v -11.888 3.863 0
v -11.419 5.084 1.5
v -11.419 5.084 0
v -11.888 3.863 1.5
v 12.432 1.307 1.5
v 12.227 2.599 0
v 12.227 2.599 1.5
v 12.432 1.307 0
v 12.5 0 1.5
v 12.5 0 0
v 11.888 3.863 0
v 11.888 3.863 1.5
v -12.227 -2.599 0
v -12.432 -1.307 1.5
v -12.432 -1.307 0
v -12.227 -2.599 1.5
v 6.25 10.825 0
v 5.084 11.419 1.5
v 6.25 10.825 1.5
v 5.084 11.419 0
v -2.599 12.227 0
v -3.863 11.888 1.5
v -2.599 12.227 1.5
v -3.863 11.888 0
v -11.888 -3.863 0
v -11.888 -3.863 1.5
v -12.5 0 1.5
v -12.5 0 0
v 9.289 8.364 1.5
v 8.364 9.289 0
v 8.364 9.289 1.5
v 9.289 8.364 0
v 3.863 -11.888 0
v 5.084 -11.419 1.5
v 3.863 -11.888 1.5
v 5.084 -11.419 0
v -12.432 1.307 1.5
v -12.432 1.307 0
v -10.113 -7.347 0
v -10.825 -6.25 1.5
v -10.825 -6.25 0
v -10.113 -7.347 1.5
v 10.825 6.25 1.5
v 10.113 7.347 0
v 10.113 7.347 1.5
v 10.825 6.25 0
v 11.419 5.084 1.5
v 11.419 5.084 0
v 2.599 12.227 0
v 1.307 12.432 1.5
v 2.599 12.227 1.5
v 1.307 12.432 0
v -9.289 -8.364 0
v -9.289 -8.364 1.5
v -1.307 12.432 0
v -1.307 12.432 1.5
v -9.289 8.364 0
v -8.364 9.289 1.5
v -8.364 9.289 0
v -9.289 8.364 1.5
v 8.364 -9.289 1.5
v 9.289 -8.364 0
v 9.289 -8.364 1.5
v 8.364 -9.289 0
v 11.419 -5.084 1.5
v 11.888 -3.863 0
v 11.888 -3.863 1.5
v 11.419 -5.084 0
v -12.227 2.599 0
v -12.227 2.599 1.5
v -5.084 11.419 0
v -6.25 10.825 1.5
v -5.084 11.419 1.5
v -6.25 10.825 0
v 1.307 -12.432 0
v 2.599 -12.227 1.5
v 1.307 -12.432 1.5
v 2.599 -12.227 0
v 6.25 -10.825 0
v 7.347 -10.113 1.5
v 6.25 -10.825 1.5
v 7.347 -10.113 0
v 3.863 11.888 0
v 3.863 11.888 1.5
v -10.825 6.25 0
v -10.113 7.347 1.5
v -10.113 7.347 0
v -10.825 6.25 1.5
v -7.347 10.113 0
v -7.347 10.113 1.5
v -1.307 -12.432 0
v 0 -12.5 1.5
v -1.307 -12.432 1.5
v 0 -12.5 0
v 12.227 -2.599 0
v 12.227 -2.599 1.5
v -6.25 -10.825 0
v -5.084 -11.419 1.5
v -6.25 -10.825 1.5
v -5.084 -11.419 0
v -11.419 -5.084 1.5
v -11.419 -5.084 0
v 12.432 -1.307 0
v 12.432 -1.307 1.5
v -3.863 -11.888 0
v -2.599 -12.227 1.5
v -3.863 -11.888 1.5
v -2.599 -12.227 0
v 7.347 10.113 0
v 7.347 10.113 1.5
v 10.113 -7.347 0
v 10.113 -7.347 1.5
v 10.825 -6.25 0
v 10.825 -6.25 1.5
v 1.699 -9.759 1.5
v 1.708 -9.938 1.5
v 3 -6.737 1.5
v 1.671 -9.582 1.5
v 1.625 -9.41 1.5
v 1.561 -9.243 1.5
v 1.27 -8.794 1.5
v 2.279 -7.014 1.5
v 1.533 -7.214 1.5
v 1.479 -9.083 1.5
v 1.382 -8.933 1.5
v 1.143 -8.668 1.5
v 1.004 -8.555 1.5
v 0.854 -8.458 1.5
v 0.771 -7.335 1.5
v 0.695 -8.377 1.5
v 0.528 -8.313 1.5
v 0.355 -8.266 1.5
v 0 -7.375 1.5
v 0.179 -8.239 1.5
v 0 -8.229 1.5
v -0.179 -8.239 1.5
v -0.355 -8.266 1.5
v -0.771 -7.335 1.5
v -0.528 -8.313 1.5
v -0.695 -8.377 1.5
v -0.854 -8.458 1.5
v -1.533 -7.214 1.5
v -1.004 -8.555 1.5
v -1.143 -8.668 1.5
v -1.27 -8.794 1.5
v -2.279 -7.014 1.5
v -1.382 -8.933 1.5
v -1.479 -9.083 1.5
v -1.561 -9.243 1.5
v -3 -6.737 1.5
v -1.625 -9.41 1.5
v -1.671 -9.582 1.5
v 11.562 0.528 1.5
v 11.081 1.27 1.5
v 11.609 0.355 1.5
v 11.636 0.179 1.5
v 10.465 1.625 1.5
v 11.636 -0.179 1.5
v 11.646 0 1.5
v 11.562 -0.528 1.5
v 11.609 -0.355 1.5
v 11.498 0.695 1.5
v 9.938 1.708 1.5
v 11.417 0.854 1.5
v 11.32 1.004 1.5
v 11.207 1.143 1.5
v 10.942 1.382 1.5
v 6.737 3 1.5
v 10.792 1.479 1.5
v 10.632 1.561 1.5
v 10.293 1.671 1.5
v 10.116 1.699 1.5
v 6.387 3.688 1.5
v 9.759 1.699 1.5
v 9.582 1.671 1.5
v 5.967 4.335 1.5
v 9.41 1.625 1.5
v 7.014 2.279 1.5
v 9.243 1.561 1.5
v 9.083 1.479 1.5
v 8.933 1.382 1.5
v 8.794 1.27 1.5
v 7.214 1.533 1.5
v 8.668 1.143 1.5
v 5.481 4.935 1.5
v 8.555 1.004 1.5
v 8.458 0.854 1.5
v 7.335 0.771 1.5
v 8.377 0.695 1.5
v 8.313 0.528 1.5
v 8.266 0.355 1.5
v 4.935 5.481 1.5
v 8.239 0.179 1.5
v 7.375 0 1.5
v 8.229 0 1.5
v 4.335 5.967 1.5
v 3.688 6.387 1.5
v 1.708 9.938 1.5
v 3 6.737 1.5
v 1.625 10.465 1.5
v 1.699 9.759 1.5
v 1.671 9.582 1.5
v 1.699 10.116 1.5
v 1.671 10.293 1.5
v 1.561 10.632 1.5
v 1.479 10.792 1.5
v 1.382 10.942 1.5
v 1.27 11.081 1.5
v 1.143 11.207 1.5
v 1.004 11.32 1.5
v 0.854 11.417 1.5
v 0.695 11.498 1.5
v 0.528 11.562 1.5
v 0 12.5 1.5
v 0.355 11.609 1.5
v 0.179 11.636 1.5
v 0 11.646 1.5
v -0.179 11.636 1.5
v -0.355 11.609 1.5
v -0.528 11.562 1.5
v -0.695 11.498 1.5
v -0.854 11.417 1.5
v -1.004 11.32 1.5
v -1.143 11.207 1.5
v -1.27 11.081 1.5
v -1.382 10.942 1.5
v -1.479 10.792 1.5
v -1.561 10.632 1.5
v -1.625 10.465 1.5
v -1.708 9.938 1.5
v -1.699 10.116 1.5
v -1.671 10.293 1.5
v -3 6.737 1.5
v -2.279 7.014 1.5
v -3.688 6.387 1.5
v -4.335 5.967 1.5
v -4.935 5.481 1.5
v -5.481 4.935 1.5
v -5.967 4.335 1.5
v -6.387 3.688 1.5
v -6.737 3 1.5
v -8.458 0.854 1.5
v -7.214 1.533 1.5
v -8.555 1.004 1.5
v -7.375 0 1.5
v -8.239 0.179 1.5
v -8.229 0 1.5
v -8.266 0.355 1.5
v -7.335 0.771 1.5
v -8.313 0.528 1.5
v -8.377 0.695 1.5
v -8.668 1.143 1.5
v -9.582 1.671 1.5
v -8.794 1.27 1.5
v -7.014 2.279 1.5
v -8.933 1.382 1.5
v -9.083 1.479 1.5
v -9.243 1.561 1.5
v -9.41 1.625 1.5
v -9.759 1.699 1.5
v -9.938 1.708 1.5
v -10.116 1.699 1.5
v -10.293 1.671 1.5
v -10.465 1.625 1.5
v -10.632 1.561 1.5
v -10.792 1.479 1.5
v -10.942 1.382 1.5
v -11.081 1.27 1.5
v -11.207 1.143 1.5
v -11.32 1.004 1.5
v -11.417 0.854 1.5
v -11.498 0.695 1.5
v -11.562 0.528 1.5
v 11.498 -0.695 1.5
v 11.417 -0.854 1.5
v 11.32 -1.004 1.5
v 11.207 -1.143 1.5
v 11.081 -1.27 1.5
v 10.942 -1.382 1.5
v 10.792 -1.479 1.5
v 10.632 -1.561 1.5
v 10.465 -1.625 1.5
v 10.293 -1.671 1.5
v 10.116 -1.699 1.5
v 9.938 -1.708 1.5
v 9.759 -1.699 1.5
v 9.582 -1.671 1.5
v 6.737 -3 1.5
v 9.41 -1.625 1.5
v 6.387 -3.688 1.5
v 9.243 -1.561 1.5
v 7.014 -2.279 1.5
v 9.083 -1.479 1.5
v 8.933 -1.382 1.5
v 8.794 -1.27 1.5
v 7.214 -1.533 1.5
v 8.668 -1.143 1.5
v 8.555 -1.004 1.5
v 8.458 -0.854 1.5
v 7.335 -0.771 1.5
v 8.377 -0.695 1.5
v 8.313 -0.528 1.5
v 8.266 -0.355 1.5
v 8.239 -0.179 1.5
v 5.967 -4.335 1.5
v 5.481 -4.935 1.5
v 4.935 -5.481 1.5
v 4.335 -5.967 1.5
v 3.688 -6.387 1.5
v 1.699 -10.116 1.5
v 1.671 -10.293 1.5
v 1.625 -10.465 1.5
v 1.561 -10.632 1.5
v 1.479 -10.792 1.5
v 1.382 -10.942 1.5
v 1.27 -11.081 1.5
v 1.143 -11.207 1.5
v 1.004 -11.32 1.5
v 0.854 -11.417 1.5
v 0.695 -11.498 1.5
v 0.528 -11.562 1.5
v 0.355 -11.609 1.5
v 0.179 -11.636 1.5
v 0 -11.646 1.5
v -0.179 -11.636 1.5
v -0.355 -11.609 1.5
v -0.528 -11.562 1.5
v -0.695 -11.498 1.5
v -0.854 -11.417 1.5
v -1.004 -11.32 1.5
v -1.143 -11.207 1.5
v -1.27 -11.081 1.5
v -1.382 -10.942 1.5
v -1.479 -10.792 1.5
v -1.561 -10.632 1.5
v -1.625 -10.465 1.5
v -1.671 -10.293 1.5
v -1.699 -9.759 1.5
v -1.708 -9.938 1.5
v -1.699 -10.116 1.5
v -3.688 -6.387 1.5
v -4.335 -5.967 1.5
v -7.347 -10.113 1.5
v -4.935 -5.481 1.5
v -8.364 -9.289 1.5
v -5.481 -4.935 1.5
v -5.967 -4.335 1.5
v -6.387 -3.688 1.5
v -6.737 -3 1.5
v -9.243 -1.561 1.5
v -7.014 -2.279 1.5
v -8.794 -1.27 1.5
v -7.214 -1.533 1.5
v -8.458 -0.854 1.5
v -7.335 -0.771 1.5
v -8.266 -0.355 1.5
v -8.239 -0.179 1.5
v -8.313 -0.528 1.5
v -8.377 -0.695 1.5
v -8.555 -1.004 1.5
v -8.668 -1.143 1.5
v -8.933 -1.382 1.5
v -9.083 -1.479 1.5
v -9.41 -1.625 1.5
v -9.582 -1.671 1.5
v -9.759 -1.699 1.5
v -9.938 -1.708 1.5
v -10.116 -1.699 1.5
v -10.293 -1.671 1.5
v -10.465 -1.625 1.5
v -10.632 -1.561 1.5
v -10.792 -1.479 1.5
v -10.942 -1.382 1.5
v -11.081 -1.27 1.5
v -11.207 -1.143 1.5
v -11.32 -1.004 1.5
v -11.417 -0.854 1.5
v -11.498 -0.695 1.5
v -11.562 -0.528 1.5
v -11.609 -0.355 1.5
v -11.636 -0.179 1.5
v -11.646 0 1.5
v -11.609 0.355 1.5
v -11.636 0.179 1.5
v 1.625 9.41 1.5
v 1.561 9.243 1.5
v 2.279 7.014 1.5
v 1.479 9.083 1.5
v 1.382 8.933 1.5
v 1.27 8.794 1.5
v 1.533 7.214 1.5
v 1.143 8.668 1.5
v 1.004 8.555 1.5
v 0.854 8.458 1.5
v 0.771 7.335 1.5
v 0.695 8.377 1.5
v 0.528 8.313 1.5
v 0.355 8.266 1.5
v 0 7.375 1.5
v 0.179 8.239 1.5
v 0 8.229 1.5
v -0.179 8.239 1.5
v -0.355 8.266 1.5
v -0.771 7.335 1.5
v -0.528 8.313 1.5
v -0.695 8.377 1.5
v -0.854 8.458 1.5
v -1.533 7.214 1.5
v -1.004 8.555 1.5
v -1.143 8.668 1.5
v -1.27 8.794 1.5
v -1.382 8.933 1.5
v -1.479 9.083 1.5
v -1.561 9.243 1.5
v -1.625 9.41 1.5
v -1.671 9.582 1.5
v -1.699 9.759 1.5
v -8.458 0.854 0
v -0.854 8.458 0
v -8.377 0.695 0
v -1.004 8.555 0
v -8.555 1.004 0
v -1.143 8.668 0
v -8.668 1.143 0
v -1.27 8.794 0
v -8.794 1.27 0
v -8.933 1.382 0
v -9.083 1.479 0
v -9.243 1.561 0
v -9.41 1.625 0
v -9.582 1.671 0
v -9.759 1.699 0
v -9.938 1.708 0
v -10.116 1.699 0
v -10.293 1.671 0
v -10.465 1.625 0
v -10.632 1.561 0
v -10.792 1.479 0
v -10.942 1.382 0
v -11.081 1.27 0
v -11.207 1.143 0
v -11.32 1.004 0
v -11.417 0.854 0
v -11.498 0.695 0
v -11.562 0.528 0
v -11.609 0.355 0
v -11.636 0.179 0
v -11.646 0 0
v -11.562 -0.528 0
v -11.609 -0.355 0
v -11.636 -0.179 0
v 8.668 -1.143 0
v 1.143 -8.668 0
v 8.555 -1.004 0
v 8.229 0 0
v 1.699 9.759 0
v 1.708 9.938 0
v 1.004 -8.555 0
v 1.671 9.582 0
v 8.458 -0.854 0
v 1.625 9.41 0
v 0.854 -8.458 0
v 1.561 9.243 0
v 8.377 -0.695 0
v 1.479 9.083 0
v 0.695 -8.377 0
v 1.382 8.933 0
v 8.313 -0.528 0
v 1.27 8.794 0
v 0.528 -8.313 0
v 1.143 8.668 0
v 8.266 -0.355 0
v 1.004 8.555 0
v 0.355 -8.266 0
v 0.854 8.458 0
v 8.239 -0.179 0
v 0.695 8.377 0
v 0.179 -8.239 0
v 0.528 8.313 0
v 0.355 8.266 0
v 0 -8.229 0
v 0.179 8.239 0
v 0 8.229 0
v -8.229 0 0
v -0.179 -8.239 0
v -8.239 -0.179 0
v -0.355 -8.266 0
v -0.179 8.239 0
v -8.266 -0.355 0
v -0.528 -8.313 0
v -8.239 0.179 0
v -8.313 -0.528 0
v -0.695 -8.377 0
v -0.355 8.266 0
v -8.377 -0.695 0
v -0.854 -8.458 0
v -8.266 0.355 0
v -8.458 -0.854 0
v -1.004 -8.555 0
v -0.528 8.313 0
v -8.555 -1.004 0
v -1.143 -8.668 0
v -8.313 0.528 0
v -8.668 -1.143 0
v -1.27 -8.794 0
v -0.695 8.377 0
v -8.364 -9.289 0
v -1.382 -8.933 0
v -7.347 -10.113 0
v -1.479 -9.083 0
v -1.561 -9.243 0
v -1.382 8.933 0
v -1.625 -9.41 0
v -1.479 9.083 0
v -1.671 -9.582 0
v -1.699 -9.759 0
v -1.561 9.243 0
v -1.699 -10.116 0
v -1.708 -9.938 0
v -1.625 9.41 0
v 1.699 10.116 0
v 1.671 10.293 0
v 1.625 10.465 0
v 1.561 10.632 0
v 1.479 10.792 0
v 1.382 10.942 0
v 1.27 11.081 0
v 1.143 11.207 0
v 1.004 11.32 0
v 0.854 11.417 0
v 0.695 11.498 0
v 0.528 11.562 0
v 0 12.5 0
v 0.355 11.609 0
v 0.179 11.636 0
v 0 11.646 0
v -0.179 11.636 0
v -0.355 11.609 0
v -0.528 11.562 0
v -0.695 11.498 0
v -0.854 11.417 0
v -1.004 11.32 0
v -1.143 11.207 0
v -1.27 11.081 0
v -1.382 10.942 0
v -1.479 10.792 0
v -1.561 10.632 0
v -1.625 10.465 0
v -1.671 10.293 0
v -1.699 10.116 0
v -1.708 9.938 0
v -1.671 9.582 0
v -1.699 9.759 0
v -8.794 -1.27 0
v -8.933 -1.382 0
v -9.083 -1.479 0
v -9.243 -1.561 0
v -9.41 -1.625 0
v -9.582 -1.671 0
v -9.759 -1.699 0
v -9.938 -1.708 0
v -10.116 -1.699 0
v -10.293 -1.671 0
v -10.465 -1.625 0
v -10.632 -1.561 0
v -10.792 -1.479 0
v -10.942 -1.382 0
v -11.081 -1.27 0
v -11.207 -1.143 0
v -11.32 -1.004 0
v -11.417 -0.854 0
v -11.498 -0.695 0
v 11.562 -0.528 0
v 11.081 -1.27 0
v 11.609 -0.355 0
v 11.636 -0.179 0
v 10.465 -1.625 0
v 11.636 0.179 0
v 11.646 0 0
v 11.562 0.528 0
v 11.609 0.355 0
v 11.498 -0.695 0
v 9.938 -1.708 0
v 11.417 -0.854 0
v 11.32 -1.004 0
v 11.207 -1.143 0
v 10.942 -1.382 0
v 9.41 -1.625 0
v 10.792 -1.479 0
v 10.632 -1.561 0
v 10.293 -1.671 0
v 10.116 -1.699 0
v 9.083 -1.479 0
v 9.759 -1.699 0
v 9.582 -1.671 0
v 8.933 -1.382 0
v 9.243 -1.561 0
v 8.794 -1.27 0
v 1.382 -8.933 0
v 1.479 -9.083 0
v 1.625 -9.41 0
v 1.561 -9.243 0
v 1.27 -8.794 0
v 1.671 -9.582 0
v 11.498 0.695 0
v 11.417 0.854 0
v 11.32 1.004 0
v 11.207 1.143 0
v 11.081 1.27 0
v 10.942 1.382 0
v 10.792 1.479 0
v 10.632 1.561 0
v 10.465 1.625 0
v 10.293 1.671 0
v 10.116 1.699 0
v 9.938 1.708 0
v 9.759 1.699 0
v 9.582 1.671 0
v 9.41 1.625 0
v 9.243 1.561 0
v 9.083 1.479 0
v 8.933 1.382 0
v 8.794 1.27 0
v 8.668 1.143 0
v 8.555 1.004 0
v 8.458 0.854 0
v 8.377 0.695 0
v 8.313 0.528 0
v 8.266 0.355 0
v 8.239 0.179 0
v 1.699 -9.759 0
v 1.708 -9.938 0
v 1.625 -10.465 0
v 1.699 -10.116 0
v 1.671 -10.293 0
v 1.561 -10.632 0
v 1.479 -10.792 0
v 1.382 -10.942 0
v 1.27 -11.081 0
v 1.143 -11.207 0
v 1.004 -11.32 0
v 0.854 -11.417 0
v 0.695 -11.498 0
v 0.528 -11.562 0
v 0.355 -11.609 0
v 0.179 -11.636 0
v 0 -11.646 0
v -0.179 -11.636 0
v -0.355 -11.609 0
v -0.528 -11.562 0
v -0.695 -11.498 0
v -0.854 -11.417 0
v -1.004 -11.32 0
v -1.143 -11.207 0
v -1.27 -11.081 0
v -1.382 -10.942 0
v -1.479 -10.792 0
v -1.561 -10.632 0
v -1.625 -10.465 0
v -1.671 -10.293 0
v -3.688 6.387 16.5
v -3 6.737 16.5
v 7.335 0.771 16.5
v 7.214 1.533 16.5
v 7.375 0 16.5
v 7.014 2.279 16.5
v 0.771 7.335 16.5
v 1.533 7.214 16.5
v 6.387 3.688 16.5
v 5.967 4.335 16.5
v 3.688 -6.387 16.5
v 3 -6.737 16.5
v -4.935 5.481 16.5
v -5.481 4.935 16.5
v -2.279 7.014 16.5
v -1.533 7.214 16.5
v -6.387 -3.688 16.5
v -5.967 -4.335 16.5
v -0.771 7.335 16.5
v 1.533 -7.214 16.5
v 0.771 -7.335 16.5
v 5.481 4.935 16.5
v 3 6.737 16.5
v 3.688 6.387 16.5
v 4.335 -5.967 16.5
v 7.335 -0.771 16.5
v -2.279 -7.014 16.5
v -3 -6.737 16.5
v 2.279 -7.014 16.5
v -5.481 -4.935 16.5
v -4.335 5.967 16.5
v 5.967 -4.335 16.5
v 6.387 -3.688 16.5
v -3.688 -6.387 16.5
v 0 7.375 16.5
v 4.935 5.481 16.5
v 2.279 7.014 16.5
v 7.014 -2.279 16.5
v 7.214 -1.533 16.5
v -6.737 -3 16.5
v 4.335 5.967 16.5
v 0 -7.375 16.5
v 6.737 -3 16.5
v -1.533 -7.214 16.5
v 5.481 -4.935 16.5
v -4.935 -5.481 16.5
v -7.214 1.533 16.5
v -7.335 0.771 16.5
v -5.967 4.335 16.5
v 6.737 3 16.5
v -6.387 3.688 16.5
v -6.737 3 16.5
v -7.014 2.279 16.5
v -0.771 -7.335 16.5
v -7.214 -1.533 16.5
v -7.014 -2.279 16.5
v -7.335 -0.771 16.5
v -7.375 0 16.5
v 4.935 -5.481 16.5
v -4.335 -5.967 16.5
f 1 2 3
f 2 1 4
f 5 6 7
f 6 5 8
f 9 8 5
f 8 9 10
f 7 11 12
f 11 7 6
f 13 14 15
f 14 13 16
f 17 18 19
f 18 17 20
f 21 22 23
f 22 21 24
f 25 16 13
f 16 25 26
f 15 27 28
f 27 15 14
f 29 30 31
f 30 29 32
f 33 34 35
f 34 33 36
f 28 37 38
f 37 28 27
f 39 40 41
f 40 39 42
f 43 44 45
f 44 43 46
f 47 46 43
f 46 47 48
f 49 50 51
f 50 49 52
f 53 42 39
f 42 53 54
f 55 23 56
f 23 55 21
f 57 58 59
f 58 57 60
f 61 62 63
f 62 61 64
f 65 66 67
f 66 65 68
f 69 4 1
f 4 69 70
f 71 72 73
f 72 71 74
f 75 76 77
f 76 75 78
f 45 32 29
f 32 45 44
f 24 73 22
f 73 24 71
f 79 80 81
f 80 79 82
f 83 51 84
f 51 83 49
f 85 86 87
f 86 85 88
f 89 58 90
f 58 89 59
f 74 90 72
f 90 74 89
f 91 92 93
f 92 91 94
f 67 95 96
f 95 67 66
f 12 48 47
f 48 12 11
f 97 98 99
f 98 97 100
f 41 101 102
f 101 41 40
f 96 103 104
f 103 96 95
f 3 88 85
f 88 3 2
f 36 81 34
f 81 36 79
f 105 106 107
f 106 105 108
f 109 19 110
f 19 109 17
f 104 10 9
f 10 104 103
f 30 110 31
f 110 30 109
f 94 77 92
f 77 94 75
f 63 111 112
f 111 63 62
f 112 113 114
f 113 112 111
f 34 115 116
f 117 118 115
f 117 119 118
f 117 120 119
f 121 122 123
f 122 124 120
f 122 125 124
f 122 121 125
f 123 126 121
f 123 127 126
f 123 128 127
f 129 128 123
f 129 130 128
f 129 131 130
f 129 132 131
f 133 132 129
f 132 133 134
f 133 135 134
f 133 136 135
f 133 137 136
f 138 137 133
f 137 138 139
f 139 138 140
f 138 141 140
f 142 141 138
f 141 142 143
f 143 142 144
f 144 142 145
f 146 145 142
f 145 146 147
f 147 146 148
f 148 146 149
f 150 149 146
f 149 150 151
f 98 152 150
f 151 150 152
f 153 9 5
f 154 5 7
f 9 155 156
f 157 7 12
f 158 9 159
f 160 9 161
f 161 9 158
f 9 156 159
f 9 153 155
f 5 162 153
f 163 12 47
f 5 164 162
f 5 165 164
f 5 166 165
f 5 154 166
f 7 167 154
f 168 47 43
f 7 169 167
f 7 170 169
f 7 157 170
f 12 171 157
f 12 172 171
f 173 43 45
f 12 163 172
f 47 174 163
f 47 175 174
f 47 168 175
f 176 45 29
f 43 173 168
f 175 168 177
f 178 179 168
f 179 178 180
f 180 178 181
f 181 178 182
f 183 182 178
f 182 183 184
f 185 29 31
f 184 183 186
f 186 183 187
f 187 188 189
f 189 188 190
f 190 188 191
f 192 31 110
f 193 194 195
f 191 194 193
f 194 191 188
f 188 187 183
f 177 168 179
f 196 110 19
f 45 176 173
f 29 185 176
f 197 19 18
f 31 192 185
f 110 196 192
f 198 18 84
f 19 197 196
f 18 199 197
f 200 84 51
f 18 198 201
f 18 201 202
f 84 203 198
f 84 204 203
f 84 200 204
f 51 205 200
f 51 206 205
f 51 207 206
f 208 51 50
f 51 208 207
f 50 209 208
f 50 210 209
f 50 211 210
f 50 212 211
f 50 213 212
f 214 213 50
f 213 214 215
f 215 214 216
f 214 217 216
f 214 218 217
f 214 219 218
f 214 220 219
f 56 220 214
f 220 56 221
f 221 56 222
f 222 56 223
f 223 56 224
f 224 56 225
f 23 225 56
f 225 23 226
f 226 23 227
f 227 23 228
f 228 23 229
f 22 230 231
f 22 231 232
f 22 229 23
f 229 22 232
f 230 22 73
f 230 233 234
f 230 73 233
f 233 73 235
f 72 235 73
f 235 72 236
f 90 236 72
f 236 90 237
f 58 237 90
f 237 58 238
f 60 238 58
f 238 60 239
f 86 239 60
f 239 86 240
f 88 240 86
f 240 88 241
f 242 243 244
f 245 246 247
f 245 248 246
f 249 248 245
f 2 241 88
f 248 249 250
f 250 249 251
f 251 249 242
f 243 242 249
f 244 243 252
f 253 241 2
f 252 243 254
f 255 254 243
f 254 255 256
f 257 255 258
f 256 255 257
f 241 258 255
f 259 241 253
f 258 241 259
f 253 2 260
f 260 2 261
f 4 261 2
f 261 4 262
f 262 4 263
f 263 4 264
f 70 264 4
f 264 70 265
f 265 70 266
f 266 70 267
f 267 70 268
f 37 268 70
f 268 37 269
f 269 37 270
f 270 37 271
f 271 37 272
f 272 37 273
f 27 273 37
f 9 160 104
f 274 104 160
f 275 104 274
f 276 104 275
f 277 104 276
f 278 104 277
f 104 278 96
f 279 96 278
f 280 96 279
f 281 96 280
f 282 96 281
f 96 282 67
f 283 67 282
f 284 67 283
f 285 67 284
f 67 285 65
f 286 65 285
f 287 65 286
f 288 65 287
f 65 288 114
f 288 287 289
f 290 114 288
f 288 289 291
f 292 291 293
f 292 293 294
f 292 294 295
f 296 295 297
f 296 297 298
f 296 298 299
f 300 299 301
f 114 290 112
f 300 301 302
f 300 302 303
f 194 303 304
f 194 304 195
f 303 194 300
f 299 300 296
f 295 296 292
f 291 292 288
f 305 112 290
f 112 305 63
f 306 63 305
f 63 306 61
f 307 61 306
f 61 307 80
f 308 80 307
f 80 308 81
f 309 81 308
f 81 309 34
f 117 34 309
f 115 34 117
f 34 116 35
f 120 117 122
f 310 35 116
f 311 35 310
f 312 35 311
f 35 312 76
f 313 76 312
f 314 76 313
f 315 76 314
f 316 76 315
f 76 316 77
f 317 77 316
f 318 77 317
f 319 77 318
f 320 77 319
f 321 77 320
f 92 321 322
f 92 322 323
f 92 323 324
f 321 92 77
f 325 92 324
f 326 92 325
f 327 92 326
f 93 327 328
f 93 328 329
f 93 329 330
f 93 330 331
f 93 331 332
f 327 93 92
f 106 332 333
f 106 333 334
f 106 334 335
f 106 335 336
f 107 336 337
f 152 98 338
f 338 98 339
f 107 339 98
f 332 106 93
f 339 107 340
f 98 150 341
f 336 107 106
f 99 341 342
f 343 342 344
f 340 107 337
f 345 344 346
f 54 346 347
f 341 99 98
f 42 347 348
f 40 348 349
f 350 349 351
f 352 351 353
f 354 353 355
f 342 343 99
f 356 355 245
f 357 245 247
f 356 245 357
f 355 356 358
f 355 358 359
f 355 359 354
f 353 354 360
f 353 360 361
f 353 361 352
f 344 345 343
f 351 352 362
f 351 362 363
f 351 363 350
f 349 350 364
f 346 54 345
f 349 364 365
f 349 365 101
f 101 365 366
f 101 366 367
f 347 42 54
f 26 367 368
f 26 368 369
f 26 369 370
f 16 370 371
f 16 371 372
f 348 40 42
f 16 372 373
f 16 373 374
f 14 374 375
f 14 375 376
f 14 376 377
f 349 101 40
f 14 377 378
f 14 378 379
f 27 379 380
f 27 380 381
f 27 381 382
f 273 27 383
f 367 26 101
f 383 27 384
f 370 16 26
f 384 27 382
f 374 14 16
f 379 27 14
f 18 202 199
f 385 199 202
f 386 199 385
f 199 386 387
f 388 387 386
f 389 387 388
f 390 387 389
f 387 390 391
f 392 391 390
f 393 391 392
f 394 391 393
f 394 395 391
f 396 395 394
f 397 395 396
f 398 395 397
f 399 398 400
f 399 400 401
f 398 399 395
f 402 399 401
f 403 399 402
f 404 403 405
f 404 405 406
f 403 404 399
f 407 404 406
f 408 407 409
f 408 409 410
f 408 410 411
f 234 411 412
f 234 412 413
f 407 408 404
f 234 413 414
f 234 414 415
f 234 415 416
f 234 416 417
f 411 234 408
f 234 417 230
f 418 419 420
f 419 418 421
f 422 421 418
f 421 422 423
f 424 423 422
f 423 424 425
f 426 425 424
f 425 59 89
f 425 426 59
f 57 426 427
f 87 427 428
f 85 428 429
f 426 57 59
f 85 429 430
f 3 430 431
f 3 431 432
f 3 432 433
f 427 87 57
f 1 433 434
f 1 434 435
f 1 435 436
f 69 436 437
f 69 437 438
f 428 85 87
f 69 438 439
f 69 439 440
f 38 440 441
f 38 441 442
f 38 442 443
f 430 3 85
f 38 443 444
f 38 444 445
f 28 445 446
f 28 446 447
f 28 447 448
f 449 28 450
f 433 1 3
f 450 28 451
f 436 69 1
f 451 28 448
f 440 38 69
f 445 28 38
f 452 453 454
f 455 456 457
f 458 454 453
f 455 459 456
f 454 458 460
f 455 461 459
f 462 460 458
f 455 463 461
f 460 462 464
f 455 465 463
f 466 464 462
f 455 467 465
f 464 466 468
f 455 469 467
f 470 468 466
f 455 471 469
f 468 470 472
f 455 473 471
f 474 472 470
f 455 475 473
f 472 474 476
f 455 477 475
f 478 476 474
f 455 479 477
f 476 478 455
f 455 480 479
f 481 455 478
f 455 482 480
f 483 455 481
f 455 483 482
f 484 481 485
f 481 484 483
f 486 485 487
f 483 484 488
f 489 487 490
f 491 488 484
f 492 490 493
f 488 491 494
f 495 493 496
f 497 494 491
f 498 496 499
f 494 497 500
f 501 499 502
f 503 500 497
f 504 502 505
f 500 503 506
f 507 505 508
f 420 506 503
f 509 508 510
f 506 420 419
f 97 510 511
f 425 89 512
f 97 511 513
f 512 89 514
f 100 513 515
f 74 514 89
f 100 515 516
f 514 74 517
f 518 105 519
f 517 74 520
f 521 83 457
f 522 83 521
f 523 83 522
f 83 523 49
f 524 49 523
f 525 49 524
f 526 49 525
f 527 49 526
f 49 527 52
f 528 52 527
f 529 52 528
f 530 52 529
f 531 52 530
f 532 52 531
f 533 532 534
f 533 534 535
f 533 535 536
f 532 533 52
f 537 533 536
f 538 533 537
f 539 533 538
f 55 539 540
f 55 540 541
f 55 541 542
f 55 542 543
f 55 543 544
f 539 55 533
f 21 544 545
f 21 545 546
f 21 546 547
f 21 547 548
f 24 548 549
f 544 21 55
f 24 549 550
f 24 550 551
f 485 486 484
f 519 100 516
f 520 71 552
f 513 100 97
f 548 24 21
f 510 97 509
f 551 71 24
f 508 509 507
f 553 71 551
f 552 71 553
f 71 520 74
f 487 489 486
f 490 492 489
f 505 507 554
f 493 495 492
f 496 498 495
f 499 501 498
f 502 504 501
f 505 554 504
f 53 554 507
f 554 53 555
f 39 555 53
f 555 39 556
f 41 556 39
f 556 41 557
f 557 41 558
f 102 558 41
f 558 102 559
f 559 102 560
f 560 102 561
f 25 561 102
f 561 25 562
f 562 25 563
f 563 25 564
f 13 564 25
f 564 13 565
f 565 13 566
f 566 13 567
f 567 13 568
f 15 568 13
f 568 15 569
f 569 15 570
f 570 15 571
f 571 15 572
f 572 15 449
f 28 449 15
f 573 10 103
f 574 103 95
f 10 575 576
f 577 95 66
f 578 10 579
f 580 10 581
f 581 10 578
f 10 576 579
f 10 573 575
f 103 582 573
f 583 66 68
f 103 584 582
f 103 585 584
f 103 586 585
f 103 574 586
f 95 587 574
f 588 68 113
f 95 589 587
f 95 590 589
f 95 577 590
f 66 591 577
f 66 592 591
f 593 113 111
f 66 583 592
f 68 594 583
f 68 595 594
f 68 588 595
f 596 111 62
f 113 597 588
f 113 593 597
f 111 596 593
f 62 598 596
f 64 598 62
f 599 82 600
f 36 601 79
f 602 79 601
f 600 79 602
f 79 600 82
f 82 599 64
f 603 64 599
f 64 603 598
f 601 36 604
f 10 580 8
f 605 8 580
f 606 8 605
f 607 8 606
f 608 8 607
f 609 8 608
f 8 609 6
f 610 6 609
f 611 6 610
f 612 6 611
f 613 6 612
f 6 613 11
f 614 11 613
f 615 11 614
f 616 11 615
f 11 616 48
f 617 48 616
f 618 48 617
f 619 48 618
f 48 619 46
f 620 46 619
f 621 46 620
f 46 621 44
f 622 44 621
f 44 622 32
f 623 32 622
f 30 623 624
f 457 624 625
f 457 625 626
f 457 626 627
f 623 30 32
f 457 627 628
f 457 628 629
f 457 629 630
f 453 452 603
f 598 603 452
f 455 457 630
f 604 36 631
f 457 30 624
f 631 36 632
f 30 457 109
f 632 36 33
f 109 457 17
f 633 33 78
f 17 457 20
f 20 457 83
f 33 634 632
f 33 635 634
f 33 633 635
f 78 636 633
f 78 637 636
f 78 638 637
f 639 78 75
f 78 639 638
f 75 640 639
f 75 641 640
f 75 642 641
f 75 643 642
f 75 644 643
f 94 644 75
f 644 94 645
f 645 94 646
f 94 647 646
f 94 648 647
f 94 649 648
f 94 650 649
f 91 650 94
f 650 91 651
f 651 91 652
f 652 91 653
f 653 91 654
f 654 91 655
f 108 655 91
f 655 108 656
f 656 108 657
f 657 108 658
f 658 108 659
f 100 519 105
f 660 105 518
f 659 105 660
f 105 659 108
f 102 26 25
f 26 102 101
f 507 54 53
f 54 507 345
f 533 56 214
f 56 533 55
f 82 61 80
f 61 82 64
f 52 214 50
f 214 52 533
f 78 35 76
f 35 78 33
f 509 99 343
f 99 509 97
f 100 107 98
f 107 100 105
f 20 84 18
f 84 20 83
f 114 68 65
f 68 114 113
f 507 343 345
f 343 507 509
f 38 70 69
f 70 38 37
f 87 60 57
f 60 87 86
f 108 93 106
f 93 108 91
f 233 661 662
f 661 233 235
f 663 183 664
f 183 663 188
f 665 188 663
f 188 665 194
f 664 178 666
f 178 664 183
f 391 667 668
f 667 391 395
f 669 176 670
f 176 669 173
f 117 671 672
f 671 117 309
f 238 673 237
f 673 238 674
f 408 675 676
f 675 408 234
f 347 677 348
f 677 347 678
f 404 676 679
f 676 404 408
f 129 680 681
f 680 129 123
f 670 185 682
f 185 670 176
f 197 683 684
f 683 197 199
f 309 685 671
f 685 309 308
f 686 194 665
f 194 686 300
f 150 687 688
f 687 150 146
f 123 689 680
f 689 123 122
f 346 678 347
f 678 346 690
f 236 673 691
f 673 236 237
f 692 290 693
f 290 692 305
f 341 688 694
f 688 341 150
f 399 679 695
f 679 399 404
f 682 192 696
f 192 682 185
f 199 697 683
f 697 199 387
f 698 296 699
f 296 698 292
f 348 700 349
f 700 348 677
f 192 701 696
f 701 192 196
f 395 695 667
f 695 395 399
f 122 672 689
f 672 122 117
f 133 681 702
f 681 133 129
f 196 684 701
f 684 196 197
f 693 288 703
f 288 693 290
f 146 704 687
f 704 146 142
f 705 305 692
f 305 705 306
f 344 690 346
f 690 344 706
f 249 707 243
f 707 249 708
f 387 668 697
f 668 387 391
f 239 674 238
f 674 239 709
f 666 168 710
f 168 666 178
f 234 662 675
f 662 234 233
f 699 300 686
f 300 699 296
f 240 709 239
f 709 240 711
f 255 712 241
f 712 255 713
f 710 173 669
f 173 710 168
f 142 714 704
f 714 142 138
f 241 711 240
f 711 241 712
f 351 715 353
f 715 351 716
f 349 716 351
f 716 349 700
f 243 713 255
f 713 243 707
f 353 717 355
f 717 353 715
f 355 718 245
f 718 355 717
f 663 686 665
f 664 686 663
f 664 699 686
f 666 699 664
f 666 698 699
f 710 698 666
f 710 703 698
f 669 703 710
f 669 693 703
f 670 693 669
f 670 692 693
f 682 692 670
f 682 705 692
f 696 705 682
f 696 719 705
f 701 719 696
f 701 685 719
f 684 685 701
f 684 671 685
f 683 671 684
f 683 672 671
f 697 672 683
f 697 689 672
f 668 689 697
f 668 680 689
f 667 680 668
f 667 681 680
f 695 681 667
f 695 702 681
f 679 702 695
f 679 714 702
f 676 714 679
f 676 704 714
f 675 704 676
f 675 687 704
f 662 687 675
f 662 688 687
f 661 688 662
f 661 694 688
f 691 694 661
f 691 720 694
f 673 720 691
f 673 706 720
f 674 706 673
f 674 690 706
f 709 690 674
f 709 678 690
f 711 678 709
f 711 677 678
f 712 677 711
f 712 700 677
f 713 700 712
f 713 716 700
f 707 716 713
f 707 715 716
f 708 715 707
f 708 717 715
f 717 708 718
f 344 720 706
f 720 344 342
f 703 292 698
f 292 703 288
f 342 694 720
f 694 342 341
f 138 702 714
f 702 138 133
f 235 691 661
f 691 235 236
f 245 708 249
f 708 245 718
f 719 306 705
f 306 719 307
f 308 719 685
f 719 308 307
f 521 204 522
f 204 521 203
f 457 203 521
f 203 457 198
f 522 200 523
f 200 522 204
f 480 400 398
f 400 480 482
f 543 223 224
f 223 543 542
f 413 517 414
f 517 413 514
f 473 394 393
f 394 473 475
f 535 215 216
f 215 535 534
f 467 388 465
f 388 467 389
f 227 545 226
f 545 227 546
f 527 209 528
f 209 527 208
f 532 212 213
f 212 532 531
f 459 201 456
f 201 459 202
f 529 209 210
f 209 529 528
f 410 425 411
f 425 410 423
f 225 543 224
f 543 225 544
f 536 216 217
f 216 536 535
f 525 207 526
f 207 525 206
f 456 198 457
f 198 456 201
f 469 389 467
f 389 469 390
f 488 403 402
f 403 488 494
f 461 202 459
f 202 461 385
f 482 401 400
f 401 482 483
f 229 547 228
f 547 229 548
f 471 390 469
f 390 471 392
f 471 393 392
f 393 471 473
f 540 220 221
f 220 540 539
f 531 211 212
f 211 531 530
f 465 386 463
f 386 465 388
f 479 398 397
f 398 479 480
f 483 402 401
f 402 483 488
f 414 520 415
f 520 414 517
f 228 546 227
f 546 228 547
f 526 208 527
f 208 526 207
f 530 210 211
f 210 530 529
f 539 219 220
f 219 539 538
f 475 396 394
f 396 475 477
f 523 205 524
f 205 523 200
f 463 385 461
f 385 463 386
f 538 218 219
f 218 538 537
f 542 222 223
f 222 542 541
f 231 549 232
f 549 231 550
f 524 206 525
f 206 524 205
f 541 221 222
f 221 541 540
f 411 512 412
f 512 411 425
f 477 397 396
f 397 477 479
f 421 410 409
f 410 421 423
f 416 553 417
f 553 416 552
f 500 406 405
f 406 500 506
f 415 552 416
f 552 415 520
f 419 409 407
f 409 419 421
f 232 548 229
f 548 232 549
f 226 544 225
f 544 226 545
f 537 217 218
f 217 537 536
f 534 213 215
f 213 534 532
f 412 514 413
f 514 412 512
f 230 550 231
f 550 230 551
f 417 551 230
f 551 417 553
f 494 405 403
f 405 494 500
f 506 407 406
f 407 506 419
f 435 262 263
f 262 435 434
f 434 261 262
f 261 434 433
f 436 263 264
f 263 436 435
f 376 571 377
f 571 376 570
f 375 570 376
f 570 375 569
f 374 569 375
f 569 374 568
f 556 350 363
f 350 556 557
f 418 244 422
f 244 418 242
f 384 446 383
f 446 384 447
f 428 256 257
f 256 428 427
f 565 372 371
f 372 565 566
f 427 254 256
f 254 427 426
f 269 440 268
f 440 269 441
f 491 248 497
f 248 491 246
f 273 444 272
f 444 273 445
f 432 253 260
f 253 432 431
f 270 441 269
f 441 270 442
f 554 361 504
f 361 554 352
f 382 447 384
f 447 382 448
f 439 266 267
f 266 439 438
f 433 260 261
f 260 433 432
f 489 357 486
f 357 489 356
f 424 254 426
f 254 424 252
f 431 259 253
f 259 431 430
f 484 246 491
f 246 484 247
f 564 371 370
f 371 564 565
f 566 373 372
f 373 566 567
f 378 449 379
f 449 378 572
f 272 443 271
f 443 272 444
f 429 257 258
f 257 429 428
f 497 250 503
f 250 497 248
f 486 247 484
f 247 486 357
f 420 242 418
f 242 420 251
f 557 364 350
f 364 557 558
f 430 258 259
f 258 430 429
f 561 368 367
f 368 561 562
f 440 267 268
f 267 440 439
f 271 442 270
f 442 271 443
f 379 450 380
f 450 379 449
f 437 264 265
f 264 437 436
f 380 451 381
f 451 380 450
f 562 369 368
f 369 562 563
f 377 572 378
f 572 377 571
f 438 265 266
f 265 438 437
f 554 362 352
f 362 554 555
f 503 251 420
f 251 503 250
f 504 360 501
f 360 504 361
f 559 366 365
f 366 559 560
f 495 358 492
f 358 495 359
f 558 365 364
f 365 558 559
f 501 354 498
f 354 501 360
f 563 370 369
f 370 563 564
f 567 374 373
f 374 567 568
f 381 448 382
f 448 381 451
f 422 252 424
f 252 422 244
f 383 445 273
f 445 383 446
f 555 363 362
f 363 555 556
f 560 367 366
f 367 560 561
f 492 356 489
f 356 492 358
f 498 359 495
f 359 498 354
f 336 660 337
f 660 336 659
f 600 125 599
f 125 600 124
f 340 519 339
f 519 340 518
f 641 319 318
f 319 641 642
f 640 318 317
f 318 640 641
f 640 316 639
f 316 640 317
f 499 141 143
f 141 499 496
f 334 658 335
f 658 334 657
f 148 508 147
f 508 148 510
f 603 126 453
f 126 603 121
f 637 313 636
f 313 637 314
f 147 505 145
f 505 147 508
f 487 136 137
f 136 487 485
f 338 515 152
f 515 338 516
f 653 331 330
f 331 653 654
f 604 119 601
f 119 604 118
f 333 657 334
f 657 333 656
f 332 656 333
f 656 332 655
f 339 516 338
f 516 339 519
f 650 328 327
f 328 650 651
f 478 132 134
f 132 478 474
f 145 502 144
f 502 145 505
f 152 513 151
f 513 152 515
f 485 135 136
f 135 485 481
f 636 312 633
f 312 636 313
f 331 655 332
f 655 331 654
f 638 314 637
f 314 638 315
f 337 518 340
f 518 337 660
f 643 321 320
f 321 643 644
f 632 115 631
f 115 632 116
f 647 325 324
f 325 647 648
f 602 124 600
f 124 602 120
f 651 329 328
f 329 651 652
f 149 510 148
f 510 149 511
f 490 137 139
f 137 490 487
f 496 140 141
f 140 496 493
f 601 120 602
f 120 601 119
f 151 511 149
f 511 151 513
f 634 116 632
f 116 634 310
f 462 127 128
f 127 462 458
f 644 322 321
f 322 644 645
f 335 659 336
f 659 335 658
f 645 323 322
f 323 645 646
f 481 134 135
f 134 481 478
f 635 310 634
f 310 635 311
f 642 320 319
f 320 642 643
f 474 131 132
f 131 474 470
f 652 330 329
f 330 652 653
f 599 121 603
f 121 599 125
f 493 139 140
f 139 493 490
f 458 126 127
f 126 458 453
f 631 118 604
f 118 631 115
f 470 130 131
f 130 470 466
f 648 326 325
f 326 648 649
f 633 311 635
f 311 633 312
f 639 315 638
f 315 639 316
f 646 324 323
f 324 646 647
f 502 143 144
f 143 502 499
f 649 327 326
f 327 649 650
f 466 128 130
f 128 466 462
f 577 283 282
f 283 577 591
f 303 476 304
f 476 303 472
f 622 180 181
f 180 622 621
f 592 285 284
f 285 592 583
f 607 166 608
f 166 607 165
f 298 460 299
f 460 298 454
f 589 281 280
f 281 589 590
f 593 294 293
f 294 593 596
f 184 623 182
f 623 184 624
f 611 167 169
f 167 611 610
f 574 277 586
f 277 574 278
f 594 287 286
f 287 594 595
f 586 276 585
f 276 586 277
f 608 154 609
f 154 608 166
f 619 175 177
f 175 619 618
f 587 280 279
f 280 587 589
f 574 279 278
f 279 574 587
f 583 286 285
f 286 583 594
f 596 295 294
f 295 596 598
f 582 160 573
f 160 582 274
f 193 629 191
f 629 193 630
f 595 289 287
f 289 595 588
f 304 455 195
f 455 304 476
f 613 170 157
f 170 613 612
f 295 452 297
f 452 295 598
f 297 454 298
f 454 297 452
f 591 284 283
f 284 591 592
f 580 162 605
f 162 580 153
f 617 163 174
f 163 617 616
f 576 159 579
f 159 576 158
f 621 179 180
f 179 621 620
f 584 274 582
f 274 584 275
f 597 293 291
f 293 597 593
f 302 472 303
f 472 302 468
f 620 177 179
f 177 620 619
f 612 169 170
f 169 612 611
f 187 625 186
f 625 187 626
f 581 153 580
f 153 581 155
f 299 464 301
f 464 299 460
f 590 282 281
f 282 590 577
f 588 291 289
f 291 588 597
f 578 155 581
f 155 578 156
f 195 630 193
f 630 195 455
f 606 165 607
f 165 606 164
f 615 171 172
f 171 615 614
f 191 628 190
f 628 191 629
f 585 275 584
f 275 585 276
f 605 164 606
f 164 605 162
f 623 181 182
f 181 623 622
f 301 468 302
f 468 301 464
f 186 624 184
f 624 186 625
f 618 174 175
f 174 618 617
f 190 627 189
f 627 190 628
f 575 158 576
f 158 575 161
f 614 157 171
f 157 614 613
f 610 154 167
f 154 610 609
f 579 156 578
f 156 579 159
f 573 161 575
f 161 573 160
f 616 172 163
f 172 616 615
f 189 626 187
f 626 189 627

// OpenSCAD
HOSE_DIAMETER = 14.75;
HOSE_HEIGHT = 25;
HOSE_HEIGHT_BELT = 15;

HEATSET_DIAMETER = 5.5;
HEATSET_DEPTH = 8;

FLANGE_DIAMETER = 32;
FLANGE_DIAMETER_BELT = 25;
FLANGE_HEIGHT = 1.5;

SCREW_DIAMETER = 4.5;

HOLE_DIAMETER = 23.5;
HOLE_DIAMETER_BELT = (FLANGE_DIAMETER_BELT - HOSE_DIAMETER) / 3;
HOLE_FILLER_HEIGHT = 2;

CROSS_BAR_HEIGHT = 3;
CROSS_BAR_DEPTH = 10;
CROSS_BAR_WIDTH = 32;

render_helper = 1;

$fn = 60;

module outside() {
    difference() {
        union() {
            cylinder(h = FLANGE_HEIGHT, d = FLANGE_DIAMETER);
            
            translate([0, 0, FLANGE_HEIGHT])
            cylinder(h = HOSE_HEIGHT, d = HOSE_DIAMETER);
        }
 
        cylinder(h = HEATSET_DEPTH, d = HEATSET_DIAMETER);
    }
}

module inside() {
    difference() {
        union() {
            cylinder(h = HOLE_FILLER_HEIGHT + CROSS_BAR_HEIGHT, d = HOLE_DIAMETER);
            
            translate([0, CROSS_BAR_DEPTH / 2, CROSS_BAR_HEIGHT / 2])
            cube([CROSS_BAR_WIDTH, CROSS_BAR_DEPTH, CROSS_BAR_HEIGHT], center = true);
        }
        cylinder(h = HOLE_FILLER_HEIGHT + CROSS_BAR_HEIGHT, d = SCREW_DIAMETER);
    }
}

module belt() {
    difference() {
        union() {
            cylinder(h = FLANGE_HEIGHT, d = FLANGE_DIAMETER_BELT);
            
            translate([0, 0, FLANGE_HEIGHT])
            cylinder(h = HOSE_HEIGHT_BELT, d = HOSE_DIAMETER);
        }
        
        for (i = [0 : 3]) {
            rotate([0, 0, 90 * i])
            translate([
                0,
                (FLANGE_DIAMETER_BELT) / 2 - (FLANGE_DIAMETER_BELT - HOSE_DIAMETER) / 4,
                -render_helper
            ])
            cylinder(h = FLANGE_HEIGHT + render_helper * 2, d = HOLE_DIAMETER_BELT);
        }
    }
}

belt();
